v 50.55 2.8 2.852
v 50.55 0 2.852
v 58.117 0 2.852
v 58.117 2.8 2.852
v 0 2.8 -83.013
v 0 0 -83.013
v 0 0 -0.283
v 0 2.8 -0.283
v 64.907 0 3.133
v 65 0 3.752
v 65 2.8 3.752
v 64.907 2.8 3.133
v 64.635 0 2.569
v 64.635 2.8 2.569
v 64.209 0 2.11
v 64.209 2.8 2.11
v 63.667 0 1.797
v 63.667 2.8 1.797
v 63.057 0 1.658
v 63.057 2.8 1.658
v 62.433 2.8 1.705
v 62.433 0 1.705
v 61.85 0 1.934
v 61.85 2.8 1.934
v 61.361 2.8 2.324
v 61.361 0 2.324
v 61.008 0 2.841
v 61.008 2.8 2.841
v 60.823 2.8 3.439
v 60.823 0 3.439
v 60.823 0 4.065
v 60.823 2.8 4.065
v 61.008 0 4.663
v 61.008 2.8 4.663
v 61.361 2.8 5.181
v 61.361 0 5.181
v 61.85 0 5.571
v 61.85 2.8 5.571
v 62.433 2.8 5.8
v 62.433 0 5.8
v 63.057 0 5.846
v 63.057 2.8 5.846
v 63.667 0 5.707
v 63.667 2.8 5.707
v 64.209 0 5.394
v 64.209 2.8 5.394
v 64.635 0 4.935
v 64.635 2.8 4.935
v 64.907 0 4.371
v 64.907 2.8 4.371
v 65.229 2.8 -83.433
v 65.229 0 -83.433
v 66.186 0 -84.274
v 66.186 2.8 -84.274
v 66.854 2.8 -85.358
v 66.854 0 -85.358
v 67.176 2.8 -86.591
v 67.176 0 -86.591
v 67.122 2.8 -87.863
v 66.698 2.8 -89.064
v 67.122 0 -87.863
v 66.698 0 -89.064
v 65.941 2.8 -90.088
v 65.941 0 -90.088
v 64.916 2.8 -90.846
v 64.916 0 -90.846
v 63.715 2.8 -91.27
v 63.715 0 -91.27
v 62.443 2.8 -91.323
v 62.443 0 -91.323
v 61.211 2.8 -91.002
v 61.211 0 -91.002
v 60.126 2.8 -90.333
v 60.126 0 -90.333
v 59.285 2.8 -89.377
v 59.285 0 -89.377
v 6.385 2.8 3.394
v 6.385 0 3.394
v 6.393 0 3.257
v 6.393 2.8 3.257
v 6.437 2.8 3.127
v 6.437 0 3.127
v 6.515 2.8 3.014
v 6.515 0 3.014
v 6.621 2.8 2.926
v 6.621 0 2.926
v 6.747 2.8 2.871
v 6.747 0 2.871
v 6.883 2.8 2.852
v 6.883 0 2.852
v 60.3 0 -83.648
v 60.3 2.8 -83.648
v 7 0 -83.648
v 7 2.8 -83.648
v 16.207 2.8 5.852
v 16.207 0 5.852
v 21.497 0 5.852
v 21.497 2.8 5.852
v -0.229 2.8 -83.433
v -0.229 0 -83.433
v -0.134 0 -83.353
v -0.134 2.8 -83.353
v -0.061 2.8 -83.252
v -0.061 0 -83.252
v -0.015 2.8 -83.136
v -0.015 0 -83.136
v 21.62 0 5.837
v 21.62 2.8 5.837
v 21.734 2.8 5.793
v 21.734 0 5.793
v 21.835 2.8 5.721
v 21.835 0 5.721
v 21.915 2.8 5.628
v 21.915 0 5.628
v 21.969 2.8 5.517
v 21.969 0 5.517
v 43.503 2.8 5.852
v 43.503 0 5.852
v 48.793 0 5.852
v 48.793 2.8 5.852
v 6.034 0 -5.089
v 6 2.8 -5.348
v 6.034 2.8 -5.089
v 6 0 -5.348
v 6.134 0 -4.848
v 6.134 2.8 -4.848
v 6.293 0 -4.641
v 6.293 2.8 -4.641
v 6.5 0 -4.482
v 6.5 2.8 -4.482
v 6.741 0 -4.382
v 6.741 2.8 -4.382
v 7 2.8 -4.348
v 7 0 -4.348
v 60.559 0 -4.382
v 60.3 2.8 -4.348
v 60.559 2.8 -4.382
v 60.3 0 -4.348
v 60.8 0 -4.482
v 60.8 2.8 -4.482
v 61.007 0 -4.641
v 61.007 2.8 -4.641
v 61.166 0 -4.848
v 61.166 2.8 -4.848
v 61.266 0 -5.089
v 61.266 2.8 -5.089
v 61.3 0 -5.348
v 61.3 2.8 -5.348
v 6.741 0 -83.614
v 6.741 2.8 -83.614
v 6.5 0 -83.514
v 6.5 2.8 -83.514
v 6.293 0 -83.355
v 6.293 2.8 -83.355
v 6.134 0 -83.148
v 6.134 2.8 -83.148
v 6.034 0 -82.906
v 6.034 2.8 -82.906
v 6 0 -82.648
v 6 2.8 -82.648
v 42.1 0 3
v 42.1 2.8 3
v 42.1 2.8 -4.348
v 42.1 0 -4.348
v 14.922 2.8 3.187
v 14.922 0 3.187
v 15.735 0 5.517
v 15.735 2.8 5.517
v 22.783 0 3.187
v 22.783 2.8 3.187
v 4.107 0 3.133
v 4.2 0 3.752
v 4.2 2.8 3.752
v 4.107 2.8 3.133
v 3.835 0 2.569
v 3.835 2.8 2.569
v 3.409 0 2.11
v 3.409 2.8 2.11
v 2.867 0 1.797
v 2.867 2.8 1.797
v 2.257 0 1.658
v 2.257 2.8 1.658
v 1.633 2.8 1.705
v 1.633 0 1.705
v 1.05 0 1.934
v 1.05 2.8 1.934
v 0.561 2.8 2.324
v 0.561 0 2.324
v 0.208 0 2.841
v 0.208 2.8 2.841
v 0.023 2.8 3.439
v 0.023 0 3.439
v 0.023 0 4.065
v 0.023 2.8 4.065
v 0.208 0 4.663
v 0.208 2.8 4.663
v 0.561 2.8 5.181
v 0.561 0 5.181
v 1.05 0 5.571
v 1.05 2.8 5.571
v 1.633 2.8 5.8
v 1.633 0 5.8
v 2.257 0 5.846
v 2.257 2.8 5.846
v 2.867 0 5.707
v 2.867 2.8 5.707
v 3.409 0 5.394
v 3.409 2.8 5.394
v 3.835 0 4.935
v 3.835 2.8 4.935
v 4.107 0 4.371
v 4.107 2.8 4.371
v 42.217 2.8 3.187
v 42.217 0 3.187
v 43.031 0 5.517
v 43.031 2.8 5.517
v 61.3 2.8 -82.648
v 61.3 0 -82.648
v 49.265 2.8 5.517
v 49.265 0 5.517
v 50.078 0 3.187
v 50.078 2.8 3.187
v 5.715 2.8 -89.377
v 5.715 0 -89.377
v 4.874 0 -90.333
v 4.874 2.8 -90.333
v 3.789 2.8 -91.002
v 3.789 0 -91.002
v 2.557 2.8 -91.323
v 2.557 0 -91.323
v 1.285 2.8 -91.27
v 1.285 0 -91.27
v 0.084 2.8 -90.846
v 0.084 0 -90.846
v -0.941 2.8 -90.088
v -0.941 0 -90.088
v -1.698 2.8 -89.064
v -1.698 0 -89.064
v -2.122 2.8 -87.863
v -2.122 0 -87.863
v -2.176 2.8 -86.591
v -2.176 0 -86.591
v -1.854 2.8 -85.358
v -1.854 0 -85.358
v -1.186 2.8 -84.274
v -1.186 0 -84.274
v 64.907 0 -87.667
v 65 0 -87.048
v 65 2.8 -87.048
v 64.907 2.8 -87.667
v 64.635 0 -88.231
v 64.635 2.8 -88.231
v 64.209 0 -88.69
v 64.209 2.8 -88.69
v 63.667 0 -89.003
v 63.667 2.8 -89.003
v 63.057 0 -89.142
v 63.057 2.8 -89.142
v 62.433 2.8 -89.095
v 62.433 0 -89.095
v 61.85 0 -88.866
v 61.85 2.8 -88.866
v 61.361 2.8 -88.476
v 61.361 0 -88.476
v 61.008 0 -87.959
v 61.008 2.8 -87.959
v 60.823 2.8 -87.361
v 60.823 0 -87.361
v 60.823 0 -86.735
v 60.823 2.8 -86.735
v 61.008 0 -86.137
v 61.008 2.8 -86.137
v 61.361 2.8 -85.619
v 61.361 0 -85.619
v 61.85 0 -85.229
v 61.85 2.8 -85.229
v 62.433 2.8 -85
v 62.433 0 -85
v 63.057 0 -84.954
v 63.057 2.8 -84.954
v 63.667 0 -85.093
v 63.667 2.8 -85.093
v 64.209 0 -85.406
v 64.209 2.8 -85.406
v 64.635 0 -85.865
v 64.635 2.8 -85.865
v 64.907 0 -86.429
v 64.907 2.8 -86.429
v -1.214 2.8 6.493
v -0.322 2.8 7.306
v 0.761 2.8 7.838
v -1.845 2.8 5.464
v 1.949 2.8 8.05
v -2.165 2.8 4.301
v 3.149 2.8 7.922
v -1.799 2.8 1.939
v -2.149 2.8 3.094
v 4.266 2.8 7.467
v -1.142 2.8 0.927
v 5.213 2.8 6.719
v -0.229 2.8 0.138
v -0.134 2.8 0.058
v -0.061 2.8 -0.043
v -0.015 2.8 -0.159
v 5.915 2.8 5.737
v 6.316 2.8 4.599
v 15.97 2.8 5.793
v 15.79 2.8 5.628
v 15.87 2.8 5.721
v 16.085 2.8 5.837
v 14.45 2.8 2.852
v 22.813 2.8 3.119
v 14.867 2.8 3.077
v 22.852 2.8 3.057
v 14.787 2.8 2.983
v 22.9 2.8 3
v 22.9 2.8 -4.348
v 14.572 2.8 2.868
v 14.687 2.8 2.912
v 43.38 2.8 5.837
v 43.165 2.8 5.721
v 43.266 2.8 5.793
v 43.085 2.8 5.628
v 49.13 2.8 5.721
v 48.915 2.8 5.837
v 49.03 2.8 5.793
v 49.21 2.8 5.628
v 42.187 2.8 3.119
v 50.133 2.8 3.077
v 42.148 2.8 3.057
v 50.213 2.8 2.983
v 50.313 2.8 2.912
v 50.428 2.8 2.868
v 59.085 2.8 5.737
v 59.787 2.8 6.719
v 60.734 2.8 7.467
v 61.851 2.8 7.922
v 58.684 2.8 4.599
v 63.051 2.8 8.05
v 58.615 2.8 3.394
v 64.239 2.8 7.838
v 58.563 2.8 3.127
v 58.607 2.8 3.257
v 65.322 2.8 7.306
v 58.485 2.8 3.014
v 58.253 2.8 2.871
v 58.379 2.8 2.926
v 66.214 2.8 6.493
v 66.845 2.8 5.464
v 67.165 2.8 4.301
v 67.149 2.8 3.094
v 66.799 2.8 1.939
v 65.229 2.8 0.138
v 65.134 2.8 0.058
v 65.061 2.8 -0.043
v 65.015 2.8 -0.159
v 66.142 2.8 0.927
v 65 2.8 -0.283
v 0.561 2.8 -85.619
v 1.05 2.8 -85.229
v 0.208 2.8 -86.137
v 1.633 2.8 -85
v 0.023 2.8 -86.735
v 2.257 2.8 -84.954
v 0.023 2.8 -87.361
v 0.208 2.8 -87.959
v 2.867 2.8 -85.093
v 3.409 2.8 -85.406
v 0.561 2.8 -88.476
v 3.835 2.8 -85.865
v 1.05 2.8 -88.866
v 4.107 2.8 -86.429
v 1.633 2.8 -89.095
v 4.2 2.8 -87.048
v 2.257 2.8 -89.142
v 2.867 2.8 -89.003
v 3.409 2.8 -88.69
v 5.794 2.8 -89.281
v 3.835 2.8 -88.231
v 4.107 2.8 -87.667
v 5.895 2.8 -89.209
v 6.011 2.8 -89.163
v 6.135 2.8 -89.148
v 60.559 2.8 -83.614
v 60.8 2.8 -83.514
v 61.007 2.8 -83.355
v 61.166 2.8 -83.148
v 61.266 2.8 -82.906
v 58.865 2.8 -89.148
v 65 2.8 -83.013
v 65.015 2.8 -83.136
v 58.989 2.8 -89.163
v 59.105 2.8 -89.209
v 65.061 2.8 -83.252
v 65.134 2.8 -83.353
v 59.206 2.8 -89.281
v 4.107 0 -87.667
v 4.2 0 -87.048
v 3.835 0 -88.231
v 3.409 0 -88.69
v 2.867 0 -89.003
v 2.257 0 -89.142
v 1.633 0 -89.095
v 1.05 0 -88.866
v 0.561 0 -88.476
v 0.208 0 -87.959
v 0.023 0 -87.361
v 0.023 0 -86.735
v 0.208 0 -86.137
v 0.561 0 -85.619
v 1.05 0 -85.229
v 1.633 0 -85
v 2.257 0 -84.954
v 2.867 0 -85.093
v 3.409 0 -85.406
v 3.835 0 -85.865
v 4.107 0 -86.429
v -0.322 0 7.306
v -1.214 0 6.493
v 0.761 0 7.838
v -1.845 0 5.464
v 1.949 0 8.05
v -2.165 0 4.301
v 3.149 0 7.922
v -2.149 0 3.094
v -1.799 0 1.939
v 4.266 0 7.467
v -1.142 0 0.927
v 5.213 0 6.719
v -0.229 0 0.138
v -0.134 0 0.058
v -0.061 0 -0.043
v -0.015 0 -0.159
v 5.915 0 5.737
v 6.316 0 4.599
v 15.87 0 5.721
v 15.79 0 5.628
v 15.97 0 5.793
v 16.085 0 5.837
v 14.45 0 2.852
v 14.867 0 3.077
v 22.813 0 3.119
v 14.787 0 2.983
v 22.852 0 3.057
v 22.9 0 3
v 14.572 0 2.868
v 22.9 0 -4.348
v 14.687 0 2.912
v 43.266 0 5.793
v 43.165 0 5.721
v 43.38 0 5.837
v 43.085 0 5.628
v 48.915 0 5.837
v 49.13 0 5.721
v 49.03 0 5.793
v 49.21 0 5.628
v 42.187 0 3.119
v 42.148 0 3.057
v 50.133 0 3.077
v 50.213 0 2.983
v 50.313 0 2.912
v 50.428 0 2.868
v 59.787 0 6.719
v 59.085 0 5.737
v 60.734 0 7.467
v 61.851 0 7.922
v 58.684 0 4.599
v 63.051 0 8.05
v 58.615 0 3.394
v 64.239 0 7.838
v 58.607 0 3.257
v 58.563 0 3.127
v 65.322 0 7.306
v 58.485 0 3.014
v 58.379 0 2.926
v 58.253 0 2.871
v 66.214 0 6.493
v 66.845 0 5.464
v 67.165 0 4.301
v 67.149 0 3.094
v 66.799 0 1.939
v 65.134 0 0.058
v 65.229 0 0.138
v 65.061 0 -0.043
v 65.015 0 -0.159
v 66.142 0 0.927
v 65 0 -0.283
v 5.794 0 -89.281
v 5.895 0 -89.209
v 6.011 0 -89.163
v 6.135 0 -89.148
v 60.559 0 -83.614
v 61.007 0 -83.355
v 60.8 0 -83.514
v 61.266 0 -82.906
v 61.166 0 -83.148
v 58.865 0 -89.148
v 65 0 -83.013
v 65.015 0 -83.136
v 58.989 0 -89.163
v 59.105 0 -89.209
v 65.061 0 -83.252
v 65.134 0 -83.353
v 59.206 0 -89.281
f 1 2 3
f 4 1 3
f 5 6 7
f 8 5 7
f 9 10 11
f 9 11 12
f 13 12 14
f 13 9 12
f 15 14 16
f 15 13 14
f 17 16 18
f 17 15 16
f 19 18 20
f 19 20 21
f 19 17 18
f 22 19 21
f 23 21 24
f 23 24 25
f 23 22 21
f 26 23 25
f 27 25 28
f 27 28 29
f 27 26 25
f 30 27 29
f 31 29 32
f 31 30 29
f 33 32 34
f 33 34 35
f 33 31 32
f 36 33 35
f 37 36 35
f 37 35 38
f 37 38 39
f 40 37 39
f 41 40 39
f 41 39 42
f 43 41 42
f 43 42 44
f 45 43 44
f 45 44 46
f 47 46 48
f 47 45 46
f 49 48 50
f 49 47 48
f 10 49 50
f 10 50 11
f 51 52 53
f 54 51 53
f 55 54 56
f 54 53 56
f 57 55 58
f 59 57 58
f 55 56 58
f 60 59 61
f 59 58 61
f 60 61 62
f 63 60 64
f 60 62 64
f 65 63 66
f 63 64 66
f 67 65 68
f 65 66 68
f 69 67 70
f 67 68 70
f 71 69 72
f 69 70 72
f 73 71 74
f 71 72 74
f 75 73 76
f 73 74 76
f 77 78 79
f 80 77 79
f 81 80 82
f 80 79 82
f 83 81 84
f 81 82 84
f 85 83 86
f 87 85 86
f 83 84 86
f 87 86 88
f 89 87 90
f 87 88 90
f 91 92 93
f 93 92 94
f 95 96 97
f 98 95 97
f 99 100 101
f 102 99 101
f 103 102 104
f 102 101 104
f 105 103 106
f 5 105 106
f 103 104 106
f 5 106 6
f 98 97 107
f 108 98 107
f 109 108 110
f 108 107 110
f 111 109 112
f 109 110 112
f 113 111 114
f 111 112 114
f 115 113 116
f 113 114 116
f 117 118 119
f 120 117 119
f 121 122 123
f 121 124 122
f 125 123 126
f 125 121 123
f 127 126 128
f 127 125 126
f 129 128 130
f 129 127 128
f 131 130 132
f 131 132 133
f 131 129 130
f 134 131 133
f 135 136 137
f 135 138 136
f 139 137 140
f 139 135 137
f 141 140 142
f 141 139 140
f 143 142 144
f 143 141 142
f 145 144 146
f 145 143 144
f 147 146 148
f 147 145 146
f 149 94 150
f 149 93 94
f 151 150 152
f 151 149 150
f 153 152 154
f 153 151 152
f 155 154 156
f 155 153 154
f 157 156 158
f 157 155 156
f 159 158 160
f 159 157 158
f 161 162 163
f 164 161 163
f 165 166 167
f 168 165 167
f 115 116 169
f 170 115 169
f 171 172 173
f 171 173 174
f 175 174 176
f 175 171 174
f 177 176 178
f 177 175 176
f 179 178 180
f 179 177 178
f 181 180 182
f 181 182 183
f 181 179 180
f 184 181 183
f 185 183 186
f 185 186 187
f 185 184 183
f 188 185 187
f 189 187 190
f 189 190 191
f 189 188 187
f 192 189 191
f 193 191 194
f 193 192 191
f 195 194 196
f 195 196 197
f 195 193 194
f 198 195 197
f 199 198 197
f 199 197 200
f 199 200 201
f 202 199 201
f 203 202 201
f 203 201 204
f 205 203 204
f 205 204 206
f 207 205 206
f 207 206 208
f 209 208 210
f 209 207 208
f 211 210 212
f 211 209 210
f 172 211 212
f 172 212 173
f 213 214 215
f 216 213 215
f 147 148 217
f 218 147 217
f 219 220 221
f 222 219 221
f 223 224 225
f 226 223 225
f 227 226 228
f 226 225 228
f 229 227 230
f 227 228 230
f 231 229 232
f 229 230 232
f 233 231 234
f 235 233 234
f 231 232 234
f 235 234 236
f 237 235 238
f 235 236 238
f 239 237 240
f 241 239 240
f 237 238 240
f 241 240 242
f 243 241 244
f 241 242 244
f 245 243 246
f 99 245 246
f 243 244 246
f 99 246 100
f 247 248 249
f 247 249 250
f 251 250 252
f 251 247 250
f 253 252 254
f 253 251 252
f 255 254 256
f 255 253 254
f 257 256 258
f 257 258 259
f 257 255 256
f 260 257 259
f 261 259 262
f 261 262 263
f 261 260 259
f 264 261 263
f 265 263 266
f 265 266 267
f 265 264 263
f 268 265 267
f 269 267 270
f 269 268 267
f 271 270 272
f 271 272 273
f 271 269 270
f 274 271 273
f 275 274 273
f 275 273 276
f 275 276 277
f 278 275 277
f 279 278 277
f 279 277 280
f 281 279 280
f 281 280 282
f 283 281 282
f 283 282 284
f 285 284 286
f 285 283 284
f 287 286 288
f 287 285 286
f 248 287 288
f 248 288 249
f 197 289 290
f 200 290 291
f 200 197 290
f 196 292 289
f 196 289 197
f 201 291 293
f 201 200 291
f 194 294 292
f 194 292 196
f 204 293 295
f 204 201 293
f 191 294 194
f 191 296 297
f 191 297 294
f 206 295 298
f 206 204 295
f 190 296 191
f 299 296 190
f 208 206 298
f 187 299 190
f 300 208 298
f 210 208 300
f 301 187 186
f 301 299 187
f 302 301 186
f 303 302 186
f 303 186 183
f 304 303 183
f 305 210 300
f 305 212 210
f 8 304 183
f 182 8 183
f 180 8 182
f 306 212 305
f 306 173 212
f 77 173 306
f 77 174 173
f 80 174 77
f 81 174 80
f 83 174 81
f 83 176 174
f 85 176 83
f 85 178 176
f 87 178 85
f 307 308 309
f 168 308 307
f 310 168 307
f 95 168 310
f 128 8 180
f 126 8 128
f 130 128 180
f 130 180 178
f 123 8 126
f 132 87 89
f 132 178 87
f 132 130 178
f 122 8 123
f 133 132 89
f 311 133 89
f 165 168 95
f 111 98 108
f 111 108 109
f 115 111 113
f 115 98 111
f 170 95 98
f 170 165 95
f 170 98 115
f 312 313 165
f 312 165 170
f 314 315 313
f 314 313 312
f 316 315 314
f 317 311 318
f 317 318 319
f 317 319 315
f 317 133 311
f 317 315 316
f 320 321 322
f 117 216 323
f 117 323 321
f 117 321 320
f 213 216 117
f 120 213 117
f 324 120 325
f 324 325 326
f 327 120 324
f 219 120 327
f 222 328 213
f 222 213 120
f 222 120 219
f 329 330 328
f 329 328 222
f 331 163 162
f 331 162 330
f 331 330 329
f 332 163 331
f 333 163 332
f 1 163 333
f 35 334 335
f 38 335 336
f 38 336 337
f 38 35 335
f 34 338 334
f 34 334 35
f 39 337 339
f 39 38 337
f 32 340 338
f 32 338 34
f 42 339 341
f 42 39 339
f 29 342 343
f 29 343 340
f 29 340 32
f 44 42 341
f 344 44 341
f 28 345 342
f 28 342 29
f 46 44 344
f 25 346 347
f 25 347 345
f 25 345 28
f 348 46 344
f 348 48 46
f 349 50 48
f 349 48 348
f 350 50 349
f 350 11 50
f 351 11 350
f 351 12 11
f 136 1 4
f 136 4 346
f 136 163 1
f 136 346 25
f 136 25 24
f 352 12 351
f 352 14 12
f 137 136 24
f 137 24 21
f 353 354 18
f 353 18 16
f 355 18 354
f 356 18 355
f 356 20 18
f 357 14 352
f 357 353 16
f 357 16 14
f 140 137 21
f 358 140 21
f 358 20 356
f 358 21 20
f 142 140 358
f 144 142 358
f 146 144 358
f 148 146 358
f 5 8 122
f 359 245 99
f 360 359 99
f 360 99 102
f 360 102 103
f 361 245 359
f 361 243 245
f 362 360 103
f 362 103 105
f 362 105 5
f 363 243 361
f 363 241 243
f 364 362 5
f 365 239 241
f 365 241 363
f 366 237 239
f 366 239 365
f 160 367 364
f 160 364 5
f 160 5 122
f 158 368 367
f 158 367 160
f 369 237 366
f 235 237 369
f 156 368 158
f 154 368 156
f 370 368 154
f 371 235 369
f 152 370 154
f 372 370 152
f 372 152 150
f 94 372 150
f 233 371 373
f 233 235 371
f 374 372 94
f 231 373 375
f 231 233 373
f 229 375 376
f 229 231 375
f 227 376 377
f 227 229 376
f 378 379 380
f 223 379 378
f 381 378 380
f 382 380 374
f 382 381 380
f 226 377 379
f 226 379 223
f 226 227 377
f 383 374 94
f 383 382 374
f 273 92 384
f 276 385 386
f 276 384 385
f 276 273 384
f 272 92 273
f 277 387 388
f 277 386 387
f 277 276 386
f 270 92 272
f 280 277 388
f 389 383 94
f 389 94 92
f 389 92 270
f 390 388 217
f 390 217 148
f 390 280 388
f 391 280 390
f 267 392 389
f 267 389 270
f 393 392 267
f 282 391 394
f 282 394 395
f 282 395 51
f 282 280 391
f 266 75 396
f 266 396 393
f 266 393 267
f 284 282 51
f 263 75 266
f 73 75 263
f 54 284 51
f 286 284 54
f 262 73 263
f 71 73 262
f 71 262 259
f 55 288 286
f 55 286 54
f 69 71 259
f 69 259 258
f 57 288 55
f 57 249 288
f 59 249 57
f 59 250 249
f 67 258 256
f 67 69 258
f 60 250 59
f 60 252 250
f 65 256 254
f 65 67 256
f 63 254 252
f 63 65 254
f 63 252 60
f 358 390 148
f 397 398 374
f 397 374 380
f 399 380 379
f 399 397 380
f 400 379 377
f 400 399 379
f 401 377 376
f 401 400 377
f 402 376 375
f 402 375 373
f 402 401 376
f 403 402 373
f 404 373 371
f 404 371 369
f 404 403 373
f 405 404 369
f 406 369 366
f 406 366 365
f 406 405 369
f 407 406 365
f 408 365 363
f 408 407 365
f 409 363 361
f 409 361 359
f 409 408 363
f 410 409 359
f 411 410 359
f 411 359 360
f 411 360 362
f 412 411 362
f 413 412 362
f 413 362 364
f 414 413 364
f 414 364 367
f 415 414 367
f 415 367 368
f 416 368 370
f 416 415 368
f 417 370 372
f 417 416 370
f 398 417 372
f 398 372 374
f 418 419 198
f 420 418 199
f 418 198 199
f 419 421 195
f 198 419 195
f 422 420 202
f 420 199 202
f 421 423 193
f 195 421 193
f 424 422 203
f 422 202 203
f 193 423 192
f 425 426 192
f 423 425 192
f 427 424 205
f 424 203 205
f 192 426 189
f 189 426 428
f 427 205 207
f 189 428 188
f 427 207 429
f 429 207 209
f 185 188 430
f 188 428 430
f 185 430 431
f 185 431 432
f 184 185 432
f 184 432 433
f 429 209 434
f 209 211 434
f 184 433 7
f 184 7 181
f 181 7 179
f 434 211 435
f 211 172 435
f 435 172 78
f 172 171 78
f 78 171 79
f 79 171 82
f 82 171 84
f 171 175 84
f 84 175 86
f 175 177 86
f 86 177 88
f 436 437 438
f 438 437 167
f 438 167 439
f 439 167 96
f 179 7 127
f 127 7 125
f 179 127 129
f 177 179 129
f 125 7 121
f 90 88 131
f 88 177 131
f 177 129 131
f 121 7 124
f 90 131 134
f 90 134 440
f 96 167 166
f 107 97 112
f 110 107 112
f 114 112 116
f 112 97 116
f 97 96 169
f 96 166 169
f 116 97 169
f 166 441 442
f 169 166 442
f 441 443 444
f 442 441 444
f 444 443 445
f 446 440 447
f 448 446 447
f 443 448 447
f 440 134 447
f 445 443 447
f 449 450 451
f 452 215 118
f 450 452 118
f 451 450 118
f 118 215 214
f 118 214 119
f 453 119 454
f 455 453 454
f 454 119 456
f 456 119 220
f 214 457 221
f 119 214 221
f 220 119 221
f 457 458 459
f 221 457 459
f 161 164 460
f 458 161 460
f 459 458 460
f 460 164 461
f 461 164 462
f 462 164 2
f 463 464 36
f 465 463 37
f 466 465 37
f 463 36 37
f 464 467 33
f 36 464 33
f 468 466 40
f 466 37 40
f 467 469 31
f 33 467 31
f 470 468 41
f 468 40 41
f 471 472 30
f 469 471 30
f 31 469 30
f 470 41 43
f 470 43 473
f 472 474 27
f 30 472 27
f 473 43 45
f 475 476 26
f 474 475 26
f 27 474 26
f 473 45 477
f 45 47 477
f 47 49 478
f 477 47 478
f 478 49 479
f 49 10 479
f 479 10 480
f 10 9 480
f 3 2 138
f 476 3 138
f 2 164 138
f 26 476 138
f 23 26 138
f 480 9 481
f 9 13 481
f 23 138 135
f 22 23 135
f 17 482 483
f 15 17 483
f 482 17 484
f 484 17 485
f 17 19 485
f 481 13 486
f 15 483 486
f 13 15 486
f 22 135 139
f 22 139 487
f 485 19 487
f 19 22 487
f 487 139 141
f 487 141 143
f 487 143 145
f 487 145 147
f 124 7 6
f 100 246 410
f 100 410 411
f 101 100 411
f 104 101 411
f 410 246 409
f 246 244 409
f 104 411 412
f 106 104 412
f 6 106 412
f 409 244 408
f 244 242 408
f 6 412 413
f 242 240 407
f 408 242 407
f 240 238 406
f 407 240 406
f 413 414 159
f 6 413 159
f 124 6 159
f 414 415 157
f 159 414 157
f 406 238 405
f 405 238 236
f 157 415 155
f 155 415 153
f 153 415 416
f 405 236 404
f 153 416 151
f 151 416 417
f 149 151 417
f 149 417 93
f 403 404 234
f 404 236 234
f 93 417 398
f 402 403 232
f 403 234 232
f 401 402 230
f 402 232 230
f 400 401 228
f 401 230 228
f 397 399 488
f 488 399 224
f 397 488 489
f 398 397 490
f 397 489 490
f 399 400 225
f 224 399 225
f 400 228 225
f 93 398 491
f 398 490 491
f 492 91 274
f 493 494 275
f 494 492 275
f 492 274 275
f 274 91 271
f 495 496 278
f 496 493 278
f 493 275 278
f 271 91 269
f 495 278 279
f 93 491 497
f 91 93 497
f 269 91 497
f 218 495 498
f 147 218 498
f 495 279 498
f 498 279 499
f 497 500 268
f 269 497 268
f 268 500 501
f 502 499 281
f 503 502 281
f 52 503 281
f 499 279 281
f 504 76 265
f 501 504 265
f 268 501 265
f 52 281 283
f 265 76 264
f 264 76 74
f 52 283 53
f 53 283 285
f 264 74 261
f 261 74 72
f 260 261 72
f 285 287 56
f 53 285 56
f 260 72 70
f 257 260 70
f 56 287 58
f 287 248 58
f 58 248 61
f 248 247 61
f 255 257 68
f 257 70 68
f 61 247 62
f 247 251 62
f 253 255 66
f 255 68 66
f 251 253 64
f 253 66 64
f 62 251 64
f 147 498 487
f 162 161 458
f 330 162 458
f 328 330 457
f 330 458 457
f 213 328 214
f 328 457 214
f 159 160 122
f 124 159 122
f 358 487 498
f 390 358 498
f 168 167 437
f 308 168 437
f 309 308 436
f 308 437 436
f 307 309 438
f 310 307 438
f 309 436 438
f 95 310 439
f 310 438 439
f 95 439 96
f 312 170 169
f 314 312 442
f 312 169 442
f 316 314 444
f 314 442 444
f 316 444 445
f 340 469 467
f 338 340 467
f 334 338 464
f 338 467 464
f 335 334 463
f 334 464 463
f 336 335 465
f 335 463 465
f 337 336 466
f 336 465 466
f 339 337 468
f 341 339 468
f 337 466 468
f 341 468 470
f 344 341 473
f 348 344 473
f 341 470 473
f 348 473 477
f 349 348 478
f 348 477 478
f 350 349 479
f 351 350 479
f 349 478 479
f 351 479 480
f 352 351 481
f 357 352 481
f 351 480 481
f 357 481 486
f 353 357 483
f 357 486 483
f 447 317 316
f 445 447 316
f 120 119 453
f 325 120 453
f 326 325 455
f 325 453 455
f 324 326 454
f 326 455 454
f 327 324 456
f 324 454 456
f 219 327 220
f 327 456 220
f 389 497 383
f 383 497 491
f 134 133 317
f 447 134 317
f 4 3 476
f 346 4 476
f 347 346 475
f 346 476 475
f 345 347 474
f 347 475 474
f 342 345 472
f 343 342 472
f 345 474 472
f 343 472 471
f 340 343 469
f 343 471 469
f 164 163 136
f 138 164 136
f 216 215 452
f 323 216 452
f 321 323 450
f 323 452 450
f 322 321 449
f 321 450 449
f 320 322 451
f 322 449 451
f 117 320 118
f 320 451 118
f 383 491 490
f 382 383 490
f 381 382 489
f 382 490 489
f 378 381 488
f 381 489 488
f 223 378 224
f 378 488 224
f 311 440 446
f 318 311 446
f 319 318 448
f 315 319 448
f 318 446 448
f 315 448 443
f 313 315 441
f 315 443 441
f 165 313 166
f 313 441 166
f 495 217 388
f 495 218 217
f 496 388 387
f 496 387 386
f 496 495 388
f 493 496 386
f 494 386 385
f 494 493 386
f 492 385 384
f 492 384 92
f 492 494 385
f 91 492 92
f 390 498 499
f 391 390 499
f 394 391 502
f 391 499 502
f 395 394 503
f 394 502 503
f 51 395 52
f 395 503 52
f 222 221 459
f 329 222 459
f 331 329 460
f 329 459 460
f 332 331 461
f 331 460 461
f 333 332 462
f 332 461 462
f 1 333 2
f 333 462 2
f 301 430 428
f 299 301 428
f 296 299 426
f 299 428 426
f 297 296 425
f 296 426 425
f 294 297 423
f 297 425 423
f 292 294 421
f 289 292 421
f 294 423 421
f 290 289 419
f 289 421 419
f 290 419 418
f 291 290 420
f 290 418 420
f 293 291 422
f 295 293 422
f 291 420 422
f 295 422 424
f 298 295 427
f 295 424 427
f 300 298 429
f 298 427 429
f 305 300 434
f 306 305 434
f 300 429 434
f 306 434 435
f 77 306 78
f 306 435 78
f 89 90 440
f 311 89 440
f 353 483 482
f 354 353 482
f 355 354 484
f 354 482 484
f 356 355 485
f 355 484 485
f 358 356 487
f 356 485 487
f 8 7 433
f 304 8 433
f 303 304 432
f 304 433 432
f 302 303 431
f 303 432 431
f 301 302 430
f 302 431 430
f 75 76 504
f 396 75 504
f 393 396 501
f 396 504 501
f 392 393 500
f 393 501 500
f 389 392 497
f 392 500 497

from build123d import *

# Parameters (mm, degrees)
BASEPLATE_OUTLINE_R = 2.1
BASEPLATE_DEPTH     = 2.8
CUT_EXTRUDE1_REACH  = 115.438
FILLET1_R           = 1


# Read off the part's stored shape, not the designer's step: BasePlate
with BuildPart() as part:
    # BasePlate outline → BasePlate (new body)
    with BuildSketch(Plane(origin=(0, 0, 0), x_dir=(1, 0, 0), z_dir=(0, 1, 0))):
        with BuildLine():
            Line((43.502626614, -5.852332608), (48.792614178, -5.852332608))
            ThreePointArc((48.792614178, -5.852332608), (49.082078508, -5.760021707), (49.264659986, -5.517174213))
            Line((49.264659986, -5.517174213), (50.078201202, -3.187491002))
            ThreePointArc((50.078201202, -3.187491002), (50.26078268, -2.944643509), (50.55024701, -2.852332608))
            Line((50.55024701, -2.852332608), (58.116695703, -2.852332608))
            ThreePointArc((58.116695703, -2.852332608), (58.484685739, -3.013831008), (58.614956567, -3.393999275))
            ThreePointArc((58.614956567, -3.393999275), (64.799237397, -7.61016844), (65.229166667, -0.137781095))
            ThreePointArc((65.229166667, -0.137781095), (65.061014427, 0.043158816), (65, 0.282515593))
            Line((65, 0.282515593), (65, 83.012819192))
            ThreePointArc((65, 83.012819192), (65.061014427, 83.252175969), (65.229166667, 83.433115879))
            ThreePointArc((65.229166667, 83.433115879), (65.940559159, 90.088226551), (59.285448487, 89.376834059))
            ThreePointArc((59.285448487, 89.376834059), (59.104508577, 89.208681819), (58.8651518, 89.147667392))
            Line((58.8651518, 89.147667392), (6.1348482, 89.147667392))
            ThreePointArc((6.1348482, 89.147667392), (5.895491423, 89.208681819), (5.714551513, 89.376834059))
            ThreePointArc((5.714551513, 89.376834059), (-0.940559159, 90.088226551), (-0.229166667, 83.433115879))
            ThreePointArc((-0.229166667, 83.433115879), (-0.061014427, 83.252175969), (0, 83.012819192))
            Line((0, 83.012819192), (0, 0.282515593))
            ThreePointArc((0, 0.282515593), (-0.061014427, 0.043158816), (-0.229166667, -0.137781095))
            ThreePointArc((-0.229166667, -0.137781095), (0.200762603, -7.61016844), (6.385043433, -3.393999275))
            ThreePointArc((6.385043433, -3.393999275), (6.515314261, -3.013831008), (6.883304297, -2.852332608))
            Line((6.883304297, -2.852332608), (14.44975299, -2.852332608))
            ThreePointArc((14.44975299, -2.852332608), (14.73921732, -2.944643509), (14.921798798, -3.187491002))
            Line((14.921798798, -3.187491002), (15.735340014, -5.517174213))
            ThreePointArc((15.735340014, -5.517174213), (15.917921492, -5.760021707), (16.207385822, -5.852332608))
            Line((16.207385822, -5.852332608), (21.497373386, -5.852332608))
            ThreePointArc((21.497373386, -5.852332608), (21.786837716, -5.760021707), (21.969419194, -5.517174213))
            Line((21.969419194, -5.517174213), (22.78296041, -3.187491002))
            ThreePointArc((22.78296041, -3.187491002), (22.965541888, -2.944643509), (23.255006218, -2.852332608))
            Line((23.255006218, -2.852332608), (41.744993782, -2.852332608))
            ThreePointArc((41.744993782, -2.852332608), (42.034458112, -2.944643509), (42.21703959, -3.187491002))
            Line((42.21703959, -3.187491002), (43.030580806, -5.517174213))
            ThreePointArc((43.030580806, -5.517174213), (43.213162284, -5.760021707), (43.502626614, -5.852332608))
        make_face()
        with Locations((2.1, -3.752332608)):
            Circle(BASEPLATE_OUTLINE_R, mode=Mode.SUBTRACT)
        with Locations((62.9, -3.752332608)):
            Circle(BASEPLATE_OUTLINE_R, mode=Mode.SUBTRACT)
        with Locations((2.1, 87.047667392)):
            Circle(BASEPLATE_OUTLINE_R, mode=Mode.SUBTRACT)
        with Locations((62.9, 87.047667392)):
            Circle(BASEPLATE_OUTLINE_R, mode=Mode.SUBTRACT)
    extrude(amount=BASEPLATE_DEPTH)

    # Sketch3 → Cut-Extrude1 (cut, up to next)
    with BuildSketch(Plane(origin=(0, 2.8, 0), x_dir=(1, 0, 0), z_dir=(0, 1, 0)), mode=Mode.PRIVATE) as cut_extrude1_sk1:
        Polygon((6, 83.647667392), (6, 4.347667392), (22.9, 4.347667392), (22.9, -3.00023804), (42.1, -3.00023804), (42.1, 4.347667392), (61.3, 4.347667392), (61.3, 83.647667392), align=None)
    cut_extrude1_tool1 = extrude(cut_extrude1_sk1.sketch, amount=-CUT_EXTRUDE1_REACH, mode=Mode.PRIVATE) & part.part
    add(cut_extrude1_tool1.solids().sort_by_distance((33.614156, 2.8, -42.647328))[0], mode=Mode.SUBTRACT)

    # Fillet1
    fillet1_edges = [part.edges().sort_by_distance(p)[0] for p in [
        (6, 1.4, -83.647667392),
        (61.3, 1.4, -83.647667392),
        (61.3, 1.4, -4.347667392),
        (6, 1.4, -4.347667392),
    ]]
    fillet(fillet1_edges, radius=FILLET1_R)


solid = part.part
